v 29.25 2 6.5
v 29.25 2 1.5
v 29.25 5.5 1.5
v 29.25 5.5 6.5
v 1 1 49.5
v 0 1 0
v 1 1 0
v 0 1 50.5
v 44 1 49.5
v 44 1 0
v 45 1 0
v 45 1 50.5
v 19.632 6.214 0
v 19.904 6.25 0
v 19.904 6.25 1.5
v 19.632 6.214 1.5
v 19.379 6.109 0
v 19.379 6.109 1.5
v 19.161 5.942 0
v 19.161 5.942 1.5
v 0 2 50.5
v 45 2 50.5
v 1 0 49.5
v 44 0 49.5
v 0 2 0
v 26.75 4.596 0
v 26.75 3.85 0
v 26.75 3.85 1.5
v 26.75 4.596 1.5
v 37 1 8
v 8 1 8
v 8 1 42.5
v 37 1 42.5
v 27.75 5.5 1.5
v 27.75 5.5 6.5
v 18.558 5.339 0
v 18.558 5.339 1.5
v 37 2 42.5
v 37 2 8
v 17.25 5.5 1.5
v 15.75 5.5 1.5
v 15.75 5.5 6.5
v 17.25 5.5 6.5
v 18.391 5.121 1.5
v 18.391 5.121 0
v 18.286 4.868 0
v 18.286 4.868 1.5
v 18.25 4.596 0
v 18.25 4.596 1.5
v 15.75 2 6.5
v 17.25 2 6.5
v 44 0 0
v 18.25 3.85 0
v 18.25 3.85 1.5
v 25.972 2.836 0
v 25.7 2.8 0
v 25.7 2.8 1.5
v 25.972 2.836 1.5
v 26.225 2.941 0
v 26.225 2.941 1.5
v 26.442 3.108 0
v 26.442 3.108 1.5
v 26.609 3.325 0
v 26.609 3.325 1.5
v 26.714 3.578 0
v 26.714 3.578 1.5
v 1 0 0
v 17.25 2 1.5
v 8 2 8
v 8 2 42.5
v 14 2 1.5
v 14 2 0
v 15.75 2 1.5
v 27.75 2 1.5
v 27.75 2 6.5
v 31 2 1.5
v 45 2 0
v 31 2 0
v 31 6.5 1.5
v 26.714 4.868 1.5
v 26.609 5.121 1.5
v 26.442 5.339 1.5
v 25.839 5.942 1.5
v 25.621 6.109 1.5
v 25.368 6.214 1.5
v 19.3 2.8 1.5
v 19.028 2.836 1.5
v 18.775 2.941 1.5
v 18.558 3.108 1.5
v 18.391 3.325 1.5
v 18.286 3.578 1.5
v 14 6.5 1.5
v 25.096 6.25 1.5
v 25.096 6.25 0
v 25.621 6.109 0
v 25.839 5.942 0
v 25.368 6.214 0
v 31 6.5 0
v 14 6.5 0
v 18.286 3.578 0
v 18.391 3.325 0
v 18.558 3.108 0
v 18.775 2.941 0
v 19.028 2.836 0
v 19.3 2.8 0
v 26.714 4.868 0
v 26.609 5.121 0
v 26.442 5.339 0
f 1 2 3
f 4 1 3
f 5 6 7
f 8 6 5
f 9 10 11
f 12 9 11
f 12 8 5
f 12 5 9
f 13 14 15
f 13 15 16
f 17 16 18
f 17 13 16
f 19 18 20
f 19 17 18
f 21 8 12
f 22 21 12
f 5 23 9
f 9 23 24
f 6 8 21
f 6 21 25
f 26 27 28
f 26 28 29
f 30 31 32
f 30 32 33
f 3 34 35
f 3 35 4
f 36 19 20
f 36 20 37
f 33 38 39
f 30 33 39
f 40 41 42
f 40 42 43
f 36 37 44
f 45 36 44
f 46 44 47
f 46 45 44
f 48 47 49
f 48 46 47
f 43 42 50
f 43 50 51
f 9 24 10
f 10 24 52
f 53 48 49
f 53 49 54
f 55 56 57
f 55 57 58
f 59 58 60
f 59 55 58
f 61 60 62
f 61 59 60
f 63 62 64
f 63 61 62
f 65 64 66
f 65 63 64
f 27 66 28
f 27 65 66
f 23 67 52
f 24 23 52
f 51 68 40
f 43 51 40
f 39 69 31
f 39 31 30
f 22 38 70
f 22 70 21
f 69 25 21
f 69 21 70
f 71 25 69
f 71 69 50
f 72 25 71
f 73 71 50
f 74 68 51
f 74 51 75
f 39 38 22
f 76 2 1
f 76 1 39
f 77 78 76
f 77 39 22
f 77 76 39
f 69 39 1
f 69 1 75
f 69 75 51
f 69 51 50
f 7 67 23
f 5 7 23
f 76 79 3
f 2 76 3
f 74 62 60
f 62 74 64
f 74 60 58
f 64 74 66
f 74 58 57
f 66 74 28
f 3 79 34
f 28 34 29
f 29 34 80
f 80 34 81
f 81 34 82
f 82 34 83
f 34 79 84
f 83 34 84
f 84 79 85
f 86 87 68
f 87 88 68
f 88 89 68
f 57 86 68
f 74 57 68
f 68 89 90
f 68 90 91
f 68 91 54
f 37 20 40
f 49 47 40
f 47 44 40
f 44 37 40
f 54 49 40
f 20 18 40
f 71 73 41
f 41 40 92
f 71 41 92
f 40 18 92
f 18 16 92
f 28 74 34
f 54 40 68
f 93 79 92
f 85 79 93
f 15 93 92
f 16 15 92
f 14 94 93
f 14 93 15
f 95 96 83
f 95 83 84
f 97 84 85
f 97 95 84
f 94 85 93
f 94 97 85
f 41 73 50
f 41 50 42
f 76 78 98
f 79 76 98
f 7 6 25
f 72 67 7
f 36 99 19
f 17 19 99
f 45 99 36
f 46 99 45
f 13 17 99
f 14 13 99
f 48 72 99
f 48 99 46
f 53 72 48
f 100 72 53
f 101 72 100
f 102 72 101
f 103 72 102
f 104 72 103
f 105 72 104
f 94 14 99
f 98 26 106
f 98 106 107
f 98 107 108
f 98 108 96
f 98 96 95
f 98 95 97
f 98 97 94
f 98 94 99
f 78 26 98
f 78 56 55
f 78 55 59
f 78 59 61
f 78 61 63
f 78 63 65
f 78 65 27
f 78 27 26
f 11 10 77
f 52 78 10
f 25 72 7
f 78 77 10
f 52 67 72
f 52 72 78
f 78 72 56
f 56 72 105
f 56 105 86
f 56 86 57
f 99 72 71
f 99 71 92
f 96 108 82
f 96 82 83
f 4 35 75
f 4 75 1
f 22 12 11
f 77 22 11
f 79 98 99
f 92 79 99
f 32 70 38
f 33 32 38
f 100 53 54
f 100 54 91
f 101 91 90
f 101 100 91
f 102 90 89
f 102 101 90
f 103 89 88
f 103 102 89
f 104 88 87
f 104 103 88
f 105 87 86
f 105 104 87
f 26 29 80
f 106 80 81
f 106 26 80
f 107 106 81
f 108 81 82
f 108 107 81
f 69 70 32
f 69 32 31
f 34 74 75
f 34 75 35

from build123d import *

# Parameters (mm, degrees)
CROQUIS1_W              = 45
CROQUIS1_H              = 50.5
SALIENTE_EXTRUIR1_DEPTH = 2
CROQUIS10_W             = 29
CROQUIS10_H             = 34.5
CORTAR_EXTRUIR5_DEPTH   = 1
CORTAR_EXTRUIR6_DEPTH   = 1
CROQUIS6_W              = 17
CROQUIS6_H              = 4.5
SALIENTE_EXTRUIR5_DEPTH = 1.5
CORTAR_EXTRUIR4_REACH   = 52.5
CROQUIS9_W              = 1.5
CROQUIS9_H              = 3.5
SALIENTE_EXTRUIR6_DEPTH = 5


with BuildPart() as part:
    # Croquis1 → Saliente-Extruir1 (new body)
    with BuildSketch(Plane(origin=(0, 0, 0), x_dir=(1, 0, 0), z_dir=(0, 1, 0))):
        with Locations((22.5, -25.25)):
            Rectangle(CROQUIS1_W, CROQUIS1_H)
    extrude(amount=SALIENTE_EXTRUIR1_DEPTH)

    # Croquis10 → Cortar-Extruir5 (cut)
    with BuildSketch(Plane(origin=(0, 2, 0), x_dir=(1, 0, 0), z_dir=(0, 1, 0))):
        with Locations((22.5, -25.25)):
            Rectangle(CROQUIS10_W, CROQUIS10_H)
    extrude(amount=-CORTAR_EXTRUIR5_DEPTH, mode=Mode.SUBTRACT)

    # Croquis11 → Cortar-Extruir6 (cut)
    with BuildSketch(Plane.XZ):
        Polygon((45, 0), (45, 50.5), (0, 50.5), (0, 0), (1, 0), (1, 49.5), (44, 49.5), (44, 0), align=None)
    extrude(amount=-CORTAR_EXTRUIR6_DEPTH, mode=Mode.SUBTRACT)

    # Croquis6 → Saliente-Extruir5 (add)
    with BuildSketch(Plane(origin=(0, 0, 0), x_dir=(-1, 0, 0), z_dir=(0, 0, -1))):
        with Locations((-22.5, 4.25)):
            Rectangle(CROQUIS6_W, CROQUIS6_H)
    extrude(amount=-SALIENTE_EXTRUIR5_DEPTH)

    # Croquis8 → Cortar-Extruir4 (cut, up to next)
    with BuildSketch(Plane(origin=(0, 0, 0), x_dir=(-1, 0, 0), z_dir=(0, 0, -1)), mode=Mode.PRIVATE) as cortar_extruir4_sk1:
        with BuildLine():
            Line((-19.16109127, 5.94246212), (-18.55753788, 5.33890873))
            ThreePointArc((-18.55753788, 5.33890873), (-18.329926491, 4.998264213), (-18.25, 4.596446609))
            Line((-18.25, 4.596446609), (-18.25, 3.85))
            ThreePointArc((-18.25, 3.85), (-18.55753788, 3.10753788), (-19.3, 2.8))
            Line((-19.3, 2.8), (-25.7, 2.8))
            ThreePointArc((-25.7, 2.8), (-26.44246212, 3.10753788), (-26.75, 3.85))
            Line((-26.75, 3.85), (-26.75, 4.596446609))
            ThreePointArc((-26.75, 4.596446609), (-26.670073509, 4.998264213), (-26.44246212, 5.33890873))
            Line((-26.44246212, 5.33890873), (-25.83890873, 5.94246212))
            ThreePointArc((-25.83890873, 5.94246212), (-25.498264213, 6.170073509), (-25.096446609, 6.25))
            Line((-25.096446609, 6.25), (-19.903553391, 6.25))
            ThreePointArc((-19.903553391, 6.25), (-19.501735787, 6.170073509), (-19.16109127, 5.94246212))
        make_face()
    cortar_extruir4_tool1 = extrude(cortar_extruir4_sk1.sketch, amount=-CORTAR_EXTRUIR4_REACH, mode=Mode.PRIVATE) & part.part
    add(cortar_extruir4_tool1.solids().sort_by_distance((22.5, 4.475322, 0))[0], mode=Mode.SUBTRACT)

    # Croquis9 → Saliente-Extruir6 (add)
    with BuildSketch(Plane.XY.offset(1.5)):
        with Locations((28.5, 3.75)):
            Rectangle(CROQUIS9_W, CROQUIS9_H)
        with Locations((16.5, 3.75)):
            Rectangle(CROQUIS9_W, CROQUIS9_H)
    extrude(amount=SALIENTE_EXTRUIR6_DEPTH)


solid = part.part
